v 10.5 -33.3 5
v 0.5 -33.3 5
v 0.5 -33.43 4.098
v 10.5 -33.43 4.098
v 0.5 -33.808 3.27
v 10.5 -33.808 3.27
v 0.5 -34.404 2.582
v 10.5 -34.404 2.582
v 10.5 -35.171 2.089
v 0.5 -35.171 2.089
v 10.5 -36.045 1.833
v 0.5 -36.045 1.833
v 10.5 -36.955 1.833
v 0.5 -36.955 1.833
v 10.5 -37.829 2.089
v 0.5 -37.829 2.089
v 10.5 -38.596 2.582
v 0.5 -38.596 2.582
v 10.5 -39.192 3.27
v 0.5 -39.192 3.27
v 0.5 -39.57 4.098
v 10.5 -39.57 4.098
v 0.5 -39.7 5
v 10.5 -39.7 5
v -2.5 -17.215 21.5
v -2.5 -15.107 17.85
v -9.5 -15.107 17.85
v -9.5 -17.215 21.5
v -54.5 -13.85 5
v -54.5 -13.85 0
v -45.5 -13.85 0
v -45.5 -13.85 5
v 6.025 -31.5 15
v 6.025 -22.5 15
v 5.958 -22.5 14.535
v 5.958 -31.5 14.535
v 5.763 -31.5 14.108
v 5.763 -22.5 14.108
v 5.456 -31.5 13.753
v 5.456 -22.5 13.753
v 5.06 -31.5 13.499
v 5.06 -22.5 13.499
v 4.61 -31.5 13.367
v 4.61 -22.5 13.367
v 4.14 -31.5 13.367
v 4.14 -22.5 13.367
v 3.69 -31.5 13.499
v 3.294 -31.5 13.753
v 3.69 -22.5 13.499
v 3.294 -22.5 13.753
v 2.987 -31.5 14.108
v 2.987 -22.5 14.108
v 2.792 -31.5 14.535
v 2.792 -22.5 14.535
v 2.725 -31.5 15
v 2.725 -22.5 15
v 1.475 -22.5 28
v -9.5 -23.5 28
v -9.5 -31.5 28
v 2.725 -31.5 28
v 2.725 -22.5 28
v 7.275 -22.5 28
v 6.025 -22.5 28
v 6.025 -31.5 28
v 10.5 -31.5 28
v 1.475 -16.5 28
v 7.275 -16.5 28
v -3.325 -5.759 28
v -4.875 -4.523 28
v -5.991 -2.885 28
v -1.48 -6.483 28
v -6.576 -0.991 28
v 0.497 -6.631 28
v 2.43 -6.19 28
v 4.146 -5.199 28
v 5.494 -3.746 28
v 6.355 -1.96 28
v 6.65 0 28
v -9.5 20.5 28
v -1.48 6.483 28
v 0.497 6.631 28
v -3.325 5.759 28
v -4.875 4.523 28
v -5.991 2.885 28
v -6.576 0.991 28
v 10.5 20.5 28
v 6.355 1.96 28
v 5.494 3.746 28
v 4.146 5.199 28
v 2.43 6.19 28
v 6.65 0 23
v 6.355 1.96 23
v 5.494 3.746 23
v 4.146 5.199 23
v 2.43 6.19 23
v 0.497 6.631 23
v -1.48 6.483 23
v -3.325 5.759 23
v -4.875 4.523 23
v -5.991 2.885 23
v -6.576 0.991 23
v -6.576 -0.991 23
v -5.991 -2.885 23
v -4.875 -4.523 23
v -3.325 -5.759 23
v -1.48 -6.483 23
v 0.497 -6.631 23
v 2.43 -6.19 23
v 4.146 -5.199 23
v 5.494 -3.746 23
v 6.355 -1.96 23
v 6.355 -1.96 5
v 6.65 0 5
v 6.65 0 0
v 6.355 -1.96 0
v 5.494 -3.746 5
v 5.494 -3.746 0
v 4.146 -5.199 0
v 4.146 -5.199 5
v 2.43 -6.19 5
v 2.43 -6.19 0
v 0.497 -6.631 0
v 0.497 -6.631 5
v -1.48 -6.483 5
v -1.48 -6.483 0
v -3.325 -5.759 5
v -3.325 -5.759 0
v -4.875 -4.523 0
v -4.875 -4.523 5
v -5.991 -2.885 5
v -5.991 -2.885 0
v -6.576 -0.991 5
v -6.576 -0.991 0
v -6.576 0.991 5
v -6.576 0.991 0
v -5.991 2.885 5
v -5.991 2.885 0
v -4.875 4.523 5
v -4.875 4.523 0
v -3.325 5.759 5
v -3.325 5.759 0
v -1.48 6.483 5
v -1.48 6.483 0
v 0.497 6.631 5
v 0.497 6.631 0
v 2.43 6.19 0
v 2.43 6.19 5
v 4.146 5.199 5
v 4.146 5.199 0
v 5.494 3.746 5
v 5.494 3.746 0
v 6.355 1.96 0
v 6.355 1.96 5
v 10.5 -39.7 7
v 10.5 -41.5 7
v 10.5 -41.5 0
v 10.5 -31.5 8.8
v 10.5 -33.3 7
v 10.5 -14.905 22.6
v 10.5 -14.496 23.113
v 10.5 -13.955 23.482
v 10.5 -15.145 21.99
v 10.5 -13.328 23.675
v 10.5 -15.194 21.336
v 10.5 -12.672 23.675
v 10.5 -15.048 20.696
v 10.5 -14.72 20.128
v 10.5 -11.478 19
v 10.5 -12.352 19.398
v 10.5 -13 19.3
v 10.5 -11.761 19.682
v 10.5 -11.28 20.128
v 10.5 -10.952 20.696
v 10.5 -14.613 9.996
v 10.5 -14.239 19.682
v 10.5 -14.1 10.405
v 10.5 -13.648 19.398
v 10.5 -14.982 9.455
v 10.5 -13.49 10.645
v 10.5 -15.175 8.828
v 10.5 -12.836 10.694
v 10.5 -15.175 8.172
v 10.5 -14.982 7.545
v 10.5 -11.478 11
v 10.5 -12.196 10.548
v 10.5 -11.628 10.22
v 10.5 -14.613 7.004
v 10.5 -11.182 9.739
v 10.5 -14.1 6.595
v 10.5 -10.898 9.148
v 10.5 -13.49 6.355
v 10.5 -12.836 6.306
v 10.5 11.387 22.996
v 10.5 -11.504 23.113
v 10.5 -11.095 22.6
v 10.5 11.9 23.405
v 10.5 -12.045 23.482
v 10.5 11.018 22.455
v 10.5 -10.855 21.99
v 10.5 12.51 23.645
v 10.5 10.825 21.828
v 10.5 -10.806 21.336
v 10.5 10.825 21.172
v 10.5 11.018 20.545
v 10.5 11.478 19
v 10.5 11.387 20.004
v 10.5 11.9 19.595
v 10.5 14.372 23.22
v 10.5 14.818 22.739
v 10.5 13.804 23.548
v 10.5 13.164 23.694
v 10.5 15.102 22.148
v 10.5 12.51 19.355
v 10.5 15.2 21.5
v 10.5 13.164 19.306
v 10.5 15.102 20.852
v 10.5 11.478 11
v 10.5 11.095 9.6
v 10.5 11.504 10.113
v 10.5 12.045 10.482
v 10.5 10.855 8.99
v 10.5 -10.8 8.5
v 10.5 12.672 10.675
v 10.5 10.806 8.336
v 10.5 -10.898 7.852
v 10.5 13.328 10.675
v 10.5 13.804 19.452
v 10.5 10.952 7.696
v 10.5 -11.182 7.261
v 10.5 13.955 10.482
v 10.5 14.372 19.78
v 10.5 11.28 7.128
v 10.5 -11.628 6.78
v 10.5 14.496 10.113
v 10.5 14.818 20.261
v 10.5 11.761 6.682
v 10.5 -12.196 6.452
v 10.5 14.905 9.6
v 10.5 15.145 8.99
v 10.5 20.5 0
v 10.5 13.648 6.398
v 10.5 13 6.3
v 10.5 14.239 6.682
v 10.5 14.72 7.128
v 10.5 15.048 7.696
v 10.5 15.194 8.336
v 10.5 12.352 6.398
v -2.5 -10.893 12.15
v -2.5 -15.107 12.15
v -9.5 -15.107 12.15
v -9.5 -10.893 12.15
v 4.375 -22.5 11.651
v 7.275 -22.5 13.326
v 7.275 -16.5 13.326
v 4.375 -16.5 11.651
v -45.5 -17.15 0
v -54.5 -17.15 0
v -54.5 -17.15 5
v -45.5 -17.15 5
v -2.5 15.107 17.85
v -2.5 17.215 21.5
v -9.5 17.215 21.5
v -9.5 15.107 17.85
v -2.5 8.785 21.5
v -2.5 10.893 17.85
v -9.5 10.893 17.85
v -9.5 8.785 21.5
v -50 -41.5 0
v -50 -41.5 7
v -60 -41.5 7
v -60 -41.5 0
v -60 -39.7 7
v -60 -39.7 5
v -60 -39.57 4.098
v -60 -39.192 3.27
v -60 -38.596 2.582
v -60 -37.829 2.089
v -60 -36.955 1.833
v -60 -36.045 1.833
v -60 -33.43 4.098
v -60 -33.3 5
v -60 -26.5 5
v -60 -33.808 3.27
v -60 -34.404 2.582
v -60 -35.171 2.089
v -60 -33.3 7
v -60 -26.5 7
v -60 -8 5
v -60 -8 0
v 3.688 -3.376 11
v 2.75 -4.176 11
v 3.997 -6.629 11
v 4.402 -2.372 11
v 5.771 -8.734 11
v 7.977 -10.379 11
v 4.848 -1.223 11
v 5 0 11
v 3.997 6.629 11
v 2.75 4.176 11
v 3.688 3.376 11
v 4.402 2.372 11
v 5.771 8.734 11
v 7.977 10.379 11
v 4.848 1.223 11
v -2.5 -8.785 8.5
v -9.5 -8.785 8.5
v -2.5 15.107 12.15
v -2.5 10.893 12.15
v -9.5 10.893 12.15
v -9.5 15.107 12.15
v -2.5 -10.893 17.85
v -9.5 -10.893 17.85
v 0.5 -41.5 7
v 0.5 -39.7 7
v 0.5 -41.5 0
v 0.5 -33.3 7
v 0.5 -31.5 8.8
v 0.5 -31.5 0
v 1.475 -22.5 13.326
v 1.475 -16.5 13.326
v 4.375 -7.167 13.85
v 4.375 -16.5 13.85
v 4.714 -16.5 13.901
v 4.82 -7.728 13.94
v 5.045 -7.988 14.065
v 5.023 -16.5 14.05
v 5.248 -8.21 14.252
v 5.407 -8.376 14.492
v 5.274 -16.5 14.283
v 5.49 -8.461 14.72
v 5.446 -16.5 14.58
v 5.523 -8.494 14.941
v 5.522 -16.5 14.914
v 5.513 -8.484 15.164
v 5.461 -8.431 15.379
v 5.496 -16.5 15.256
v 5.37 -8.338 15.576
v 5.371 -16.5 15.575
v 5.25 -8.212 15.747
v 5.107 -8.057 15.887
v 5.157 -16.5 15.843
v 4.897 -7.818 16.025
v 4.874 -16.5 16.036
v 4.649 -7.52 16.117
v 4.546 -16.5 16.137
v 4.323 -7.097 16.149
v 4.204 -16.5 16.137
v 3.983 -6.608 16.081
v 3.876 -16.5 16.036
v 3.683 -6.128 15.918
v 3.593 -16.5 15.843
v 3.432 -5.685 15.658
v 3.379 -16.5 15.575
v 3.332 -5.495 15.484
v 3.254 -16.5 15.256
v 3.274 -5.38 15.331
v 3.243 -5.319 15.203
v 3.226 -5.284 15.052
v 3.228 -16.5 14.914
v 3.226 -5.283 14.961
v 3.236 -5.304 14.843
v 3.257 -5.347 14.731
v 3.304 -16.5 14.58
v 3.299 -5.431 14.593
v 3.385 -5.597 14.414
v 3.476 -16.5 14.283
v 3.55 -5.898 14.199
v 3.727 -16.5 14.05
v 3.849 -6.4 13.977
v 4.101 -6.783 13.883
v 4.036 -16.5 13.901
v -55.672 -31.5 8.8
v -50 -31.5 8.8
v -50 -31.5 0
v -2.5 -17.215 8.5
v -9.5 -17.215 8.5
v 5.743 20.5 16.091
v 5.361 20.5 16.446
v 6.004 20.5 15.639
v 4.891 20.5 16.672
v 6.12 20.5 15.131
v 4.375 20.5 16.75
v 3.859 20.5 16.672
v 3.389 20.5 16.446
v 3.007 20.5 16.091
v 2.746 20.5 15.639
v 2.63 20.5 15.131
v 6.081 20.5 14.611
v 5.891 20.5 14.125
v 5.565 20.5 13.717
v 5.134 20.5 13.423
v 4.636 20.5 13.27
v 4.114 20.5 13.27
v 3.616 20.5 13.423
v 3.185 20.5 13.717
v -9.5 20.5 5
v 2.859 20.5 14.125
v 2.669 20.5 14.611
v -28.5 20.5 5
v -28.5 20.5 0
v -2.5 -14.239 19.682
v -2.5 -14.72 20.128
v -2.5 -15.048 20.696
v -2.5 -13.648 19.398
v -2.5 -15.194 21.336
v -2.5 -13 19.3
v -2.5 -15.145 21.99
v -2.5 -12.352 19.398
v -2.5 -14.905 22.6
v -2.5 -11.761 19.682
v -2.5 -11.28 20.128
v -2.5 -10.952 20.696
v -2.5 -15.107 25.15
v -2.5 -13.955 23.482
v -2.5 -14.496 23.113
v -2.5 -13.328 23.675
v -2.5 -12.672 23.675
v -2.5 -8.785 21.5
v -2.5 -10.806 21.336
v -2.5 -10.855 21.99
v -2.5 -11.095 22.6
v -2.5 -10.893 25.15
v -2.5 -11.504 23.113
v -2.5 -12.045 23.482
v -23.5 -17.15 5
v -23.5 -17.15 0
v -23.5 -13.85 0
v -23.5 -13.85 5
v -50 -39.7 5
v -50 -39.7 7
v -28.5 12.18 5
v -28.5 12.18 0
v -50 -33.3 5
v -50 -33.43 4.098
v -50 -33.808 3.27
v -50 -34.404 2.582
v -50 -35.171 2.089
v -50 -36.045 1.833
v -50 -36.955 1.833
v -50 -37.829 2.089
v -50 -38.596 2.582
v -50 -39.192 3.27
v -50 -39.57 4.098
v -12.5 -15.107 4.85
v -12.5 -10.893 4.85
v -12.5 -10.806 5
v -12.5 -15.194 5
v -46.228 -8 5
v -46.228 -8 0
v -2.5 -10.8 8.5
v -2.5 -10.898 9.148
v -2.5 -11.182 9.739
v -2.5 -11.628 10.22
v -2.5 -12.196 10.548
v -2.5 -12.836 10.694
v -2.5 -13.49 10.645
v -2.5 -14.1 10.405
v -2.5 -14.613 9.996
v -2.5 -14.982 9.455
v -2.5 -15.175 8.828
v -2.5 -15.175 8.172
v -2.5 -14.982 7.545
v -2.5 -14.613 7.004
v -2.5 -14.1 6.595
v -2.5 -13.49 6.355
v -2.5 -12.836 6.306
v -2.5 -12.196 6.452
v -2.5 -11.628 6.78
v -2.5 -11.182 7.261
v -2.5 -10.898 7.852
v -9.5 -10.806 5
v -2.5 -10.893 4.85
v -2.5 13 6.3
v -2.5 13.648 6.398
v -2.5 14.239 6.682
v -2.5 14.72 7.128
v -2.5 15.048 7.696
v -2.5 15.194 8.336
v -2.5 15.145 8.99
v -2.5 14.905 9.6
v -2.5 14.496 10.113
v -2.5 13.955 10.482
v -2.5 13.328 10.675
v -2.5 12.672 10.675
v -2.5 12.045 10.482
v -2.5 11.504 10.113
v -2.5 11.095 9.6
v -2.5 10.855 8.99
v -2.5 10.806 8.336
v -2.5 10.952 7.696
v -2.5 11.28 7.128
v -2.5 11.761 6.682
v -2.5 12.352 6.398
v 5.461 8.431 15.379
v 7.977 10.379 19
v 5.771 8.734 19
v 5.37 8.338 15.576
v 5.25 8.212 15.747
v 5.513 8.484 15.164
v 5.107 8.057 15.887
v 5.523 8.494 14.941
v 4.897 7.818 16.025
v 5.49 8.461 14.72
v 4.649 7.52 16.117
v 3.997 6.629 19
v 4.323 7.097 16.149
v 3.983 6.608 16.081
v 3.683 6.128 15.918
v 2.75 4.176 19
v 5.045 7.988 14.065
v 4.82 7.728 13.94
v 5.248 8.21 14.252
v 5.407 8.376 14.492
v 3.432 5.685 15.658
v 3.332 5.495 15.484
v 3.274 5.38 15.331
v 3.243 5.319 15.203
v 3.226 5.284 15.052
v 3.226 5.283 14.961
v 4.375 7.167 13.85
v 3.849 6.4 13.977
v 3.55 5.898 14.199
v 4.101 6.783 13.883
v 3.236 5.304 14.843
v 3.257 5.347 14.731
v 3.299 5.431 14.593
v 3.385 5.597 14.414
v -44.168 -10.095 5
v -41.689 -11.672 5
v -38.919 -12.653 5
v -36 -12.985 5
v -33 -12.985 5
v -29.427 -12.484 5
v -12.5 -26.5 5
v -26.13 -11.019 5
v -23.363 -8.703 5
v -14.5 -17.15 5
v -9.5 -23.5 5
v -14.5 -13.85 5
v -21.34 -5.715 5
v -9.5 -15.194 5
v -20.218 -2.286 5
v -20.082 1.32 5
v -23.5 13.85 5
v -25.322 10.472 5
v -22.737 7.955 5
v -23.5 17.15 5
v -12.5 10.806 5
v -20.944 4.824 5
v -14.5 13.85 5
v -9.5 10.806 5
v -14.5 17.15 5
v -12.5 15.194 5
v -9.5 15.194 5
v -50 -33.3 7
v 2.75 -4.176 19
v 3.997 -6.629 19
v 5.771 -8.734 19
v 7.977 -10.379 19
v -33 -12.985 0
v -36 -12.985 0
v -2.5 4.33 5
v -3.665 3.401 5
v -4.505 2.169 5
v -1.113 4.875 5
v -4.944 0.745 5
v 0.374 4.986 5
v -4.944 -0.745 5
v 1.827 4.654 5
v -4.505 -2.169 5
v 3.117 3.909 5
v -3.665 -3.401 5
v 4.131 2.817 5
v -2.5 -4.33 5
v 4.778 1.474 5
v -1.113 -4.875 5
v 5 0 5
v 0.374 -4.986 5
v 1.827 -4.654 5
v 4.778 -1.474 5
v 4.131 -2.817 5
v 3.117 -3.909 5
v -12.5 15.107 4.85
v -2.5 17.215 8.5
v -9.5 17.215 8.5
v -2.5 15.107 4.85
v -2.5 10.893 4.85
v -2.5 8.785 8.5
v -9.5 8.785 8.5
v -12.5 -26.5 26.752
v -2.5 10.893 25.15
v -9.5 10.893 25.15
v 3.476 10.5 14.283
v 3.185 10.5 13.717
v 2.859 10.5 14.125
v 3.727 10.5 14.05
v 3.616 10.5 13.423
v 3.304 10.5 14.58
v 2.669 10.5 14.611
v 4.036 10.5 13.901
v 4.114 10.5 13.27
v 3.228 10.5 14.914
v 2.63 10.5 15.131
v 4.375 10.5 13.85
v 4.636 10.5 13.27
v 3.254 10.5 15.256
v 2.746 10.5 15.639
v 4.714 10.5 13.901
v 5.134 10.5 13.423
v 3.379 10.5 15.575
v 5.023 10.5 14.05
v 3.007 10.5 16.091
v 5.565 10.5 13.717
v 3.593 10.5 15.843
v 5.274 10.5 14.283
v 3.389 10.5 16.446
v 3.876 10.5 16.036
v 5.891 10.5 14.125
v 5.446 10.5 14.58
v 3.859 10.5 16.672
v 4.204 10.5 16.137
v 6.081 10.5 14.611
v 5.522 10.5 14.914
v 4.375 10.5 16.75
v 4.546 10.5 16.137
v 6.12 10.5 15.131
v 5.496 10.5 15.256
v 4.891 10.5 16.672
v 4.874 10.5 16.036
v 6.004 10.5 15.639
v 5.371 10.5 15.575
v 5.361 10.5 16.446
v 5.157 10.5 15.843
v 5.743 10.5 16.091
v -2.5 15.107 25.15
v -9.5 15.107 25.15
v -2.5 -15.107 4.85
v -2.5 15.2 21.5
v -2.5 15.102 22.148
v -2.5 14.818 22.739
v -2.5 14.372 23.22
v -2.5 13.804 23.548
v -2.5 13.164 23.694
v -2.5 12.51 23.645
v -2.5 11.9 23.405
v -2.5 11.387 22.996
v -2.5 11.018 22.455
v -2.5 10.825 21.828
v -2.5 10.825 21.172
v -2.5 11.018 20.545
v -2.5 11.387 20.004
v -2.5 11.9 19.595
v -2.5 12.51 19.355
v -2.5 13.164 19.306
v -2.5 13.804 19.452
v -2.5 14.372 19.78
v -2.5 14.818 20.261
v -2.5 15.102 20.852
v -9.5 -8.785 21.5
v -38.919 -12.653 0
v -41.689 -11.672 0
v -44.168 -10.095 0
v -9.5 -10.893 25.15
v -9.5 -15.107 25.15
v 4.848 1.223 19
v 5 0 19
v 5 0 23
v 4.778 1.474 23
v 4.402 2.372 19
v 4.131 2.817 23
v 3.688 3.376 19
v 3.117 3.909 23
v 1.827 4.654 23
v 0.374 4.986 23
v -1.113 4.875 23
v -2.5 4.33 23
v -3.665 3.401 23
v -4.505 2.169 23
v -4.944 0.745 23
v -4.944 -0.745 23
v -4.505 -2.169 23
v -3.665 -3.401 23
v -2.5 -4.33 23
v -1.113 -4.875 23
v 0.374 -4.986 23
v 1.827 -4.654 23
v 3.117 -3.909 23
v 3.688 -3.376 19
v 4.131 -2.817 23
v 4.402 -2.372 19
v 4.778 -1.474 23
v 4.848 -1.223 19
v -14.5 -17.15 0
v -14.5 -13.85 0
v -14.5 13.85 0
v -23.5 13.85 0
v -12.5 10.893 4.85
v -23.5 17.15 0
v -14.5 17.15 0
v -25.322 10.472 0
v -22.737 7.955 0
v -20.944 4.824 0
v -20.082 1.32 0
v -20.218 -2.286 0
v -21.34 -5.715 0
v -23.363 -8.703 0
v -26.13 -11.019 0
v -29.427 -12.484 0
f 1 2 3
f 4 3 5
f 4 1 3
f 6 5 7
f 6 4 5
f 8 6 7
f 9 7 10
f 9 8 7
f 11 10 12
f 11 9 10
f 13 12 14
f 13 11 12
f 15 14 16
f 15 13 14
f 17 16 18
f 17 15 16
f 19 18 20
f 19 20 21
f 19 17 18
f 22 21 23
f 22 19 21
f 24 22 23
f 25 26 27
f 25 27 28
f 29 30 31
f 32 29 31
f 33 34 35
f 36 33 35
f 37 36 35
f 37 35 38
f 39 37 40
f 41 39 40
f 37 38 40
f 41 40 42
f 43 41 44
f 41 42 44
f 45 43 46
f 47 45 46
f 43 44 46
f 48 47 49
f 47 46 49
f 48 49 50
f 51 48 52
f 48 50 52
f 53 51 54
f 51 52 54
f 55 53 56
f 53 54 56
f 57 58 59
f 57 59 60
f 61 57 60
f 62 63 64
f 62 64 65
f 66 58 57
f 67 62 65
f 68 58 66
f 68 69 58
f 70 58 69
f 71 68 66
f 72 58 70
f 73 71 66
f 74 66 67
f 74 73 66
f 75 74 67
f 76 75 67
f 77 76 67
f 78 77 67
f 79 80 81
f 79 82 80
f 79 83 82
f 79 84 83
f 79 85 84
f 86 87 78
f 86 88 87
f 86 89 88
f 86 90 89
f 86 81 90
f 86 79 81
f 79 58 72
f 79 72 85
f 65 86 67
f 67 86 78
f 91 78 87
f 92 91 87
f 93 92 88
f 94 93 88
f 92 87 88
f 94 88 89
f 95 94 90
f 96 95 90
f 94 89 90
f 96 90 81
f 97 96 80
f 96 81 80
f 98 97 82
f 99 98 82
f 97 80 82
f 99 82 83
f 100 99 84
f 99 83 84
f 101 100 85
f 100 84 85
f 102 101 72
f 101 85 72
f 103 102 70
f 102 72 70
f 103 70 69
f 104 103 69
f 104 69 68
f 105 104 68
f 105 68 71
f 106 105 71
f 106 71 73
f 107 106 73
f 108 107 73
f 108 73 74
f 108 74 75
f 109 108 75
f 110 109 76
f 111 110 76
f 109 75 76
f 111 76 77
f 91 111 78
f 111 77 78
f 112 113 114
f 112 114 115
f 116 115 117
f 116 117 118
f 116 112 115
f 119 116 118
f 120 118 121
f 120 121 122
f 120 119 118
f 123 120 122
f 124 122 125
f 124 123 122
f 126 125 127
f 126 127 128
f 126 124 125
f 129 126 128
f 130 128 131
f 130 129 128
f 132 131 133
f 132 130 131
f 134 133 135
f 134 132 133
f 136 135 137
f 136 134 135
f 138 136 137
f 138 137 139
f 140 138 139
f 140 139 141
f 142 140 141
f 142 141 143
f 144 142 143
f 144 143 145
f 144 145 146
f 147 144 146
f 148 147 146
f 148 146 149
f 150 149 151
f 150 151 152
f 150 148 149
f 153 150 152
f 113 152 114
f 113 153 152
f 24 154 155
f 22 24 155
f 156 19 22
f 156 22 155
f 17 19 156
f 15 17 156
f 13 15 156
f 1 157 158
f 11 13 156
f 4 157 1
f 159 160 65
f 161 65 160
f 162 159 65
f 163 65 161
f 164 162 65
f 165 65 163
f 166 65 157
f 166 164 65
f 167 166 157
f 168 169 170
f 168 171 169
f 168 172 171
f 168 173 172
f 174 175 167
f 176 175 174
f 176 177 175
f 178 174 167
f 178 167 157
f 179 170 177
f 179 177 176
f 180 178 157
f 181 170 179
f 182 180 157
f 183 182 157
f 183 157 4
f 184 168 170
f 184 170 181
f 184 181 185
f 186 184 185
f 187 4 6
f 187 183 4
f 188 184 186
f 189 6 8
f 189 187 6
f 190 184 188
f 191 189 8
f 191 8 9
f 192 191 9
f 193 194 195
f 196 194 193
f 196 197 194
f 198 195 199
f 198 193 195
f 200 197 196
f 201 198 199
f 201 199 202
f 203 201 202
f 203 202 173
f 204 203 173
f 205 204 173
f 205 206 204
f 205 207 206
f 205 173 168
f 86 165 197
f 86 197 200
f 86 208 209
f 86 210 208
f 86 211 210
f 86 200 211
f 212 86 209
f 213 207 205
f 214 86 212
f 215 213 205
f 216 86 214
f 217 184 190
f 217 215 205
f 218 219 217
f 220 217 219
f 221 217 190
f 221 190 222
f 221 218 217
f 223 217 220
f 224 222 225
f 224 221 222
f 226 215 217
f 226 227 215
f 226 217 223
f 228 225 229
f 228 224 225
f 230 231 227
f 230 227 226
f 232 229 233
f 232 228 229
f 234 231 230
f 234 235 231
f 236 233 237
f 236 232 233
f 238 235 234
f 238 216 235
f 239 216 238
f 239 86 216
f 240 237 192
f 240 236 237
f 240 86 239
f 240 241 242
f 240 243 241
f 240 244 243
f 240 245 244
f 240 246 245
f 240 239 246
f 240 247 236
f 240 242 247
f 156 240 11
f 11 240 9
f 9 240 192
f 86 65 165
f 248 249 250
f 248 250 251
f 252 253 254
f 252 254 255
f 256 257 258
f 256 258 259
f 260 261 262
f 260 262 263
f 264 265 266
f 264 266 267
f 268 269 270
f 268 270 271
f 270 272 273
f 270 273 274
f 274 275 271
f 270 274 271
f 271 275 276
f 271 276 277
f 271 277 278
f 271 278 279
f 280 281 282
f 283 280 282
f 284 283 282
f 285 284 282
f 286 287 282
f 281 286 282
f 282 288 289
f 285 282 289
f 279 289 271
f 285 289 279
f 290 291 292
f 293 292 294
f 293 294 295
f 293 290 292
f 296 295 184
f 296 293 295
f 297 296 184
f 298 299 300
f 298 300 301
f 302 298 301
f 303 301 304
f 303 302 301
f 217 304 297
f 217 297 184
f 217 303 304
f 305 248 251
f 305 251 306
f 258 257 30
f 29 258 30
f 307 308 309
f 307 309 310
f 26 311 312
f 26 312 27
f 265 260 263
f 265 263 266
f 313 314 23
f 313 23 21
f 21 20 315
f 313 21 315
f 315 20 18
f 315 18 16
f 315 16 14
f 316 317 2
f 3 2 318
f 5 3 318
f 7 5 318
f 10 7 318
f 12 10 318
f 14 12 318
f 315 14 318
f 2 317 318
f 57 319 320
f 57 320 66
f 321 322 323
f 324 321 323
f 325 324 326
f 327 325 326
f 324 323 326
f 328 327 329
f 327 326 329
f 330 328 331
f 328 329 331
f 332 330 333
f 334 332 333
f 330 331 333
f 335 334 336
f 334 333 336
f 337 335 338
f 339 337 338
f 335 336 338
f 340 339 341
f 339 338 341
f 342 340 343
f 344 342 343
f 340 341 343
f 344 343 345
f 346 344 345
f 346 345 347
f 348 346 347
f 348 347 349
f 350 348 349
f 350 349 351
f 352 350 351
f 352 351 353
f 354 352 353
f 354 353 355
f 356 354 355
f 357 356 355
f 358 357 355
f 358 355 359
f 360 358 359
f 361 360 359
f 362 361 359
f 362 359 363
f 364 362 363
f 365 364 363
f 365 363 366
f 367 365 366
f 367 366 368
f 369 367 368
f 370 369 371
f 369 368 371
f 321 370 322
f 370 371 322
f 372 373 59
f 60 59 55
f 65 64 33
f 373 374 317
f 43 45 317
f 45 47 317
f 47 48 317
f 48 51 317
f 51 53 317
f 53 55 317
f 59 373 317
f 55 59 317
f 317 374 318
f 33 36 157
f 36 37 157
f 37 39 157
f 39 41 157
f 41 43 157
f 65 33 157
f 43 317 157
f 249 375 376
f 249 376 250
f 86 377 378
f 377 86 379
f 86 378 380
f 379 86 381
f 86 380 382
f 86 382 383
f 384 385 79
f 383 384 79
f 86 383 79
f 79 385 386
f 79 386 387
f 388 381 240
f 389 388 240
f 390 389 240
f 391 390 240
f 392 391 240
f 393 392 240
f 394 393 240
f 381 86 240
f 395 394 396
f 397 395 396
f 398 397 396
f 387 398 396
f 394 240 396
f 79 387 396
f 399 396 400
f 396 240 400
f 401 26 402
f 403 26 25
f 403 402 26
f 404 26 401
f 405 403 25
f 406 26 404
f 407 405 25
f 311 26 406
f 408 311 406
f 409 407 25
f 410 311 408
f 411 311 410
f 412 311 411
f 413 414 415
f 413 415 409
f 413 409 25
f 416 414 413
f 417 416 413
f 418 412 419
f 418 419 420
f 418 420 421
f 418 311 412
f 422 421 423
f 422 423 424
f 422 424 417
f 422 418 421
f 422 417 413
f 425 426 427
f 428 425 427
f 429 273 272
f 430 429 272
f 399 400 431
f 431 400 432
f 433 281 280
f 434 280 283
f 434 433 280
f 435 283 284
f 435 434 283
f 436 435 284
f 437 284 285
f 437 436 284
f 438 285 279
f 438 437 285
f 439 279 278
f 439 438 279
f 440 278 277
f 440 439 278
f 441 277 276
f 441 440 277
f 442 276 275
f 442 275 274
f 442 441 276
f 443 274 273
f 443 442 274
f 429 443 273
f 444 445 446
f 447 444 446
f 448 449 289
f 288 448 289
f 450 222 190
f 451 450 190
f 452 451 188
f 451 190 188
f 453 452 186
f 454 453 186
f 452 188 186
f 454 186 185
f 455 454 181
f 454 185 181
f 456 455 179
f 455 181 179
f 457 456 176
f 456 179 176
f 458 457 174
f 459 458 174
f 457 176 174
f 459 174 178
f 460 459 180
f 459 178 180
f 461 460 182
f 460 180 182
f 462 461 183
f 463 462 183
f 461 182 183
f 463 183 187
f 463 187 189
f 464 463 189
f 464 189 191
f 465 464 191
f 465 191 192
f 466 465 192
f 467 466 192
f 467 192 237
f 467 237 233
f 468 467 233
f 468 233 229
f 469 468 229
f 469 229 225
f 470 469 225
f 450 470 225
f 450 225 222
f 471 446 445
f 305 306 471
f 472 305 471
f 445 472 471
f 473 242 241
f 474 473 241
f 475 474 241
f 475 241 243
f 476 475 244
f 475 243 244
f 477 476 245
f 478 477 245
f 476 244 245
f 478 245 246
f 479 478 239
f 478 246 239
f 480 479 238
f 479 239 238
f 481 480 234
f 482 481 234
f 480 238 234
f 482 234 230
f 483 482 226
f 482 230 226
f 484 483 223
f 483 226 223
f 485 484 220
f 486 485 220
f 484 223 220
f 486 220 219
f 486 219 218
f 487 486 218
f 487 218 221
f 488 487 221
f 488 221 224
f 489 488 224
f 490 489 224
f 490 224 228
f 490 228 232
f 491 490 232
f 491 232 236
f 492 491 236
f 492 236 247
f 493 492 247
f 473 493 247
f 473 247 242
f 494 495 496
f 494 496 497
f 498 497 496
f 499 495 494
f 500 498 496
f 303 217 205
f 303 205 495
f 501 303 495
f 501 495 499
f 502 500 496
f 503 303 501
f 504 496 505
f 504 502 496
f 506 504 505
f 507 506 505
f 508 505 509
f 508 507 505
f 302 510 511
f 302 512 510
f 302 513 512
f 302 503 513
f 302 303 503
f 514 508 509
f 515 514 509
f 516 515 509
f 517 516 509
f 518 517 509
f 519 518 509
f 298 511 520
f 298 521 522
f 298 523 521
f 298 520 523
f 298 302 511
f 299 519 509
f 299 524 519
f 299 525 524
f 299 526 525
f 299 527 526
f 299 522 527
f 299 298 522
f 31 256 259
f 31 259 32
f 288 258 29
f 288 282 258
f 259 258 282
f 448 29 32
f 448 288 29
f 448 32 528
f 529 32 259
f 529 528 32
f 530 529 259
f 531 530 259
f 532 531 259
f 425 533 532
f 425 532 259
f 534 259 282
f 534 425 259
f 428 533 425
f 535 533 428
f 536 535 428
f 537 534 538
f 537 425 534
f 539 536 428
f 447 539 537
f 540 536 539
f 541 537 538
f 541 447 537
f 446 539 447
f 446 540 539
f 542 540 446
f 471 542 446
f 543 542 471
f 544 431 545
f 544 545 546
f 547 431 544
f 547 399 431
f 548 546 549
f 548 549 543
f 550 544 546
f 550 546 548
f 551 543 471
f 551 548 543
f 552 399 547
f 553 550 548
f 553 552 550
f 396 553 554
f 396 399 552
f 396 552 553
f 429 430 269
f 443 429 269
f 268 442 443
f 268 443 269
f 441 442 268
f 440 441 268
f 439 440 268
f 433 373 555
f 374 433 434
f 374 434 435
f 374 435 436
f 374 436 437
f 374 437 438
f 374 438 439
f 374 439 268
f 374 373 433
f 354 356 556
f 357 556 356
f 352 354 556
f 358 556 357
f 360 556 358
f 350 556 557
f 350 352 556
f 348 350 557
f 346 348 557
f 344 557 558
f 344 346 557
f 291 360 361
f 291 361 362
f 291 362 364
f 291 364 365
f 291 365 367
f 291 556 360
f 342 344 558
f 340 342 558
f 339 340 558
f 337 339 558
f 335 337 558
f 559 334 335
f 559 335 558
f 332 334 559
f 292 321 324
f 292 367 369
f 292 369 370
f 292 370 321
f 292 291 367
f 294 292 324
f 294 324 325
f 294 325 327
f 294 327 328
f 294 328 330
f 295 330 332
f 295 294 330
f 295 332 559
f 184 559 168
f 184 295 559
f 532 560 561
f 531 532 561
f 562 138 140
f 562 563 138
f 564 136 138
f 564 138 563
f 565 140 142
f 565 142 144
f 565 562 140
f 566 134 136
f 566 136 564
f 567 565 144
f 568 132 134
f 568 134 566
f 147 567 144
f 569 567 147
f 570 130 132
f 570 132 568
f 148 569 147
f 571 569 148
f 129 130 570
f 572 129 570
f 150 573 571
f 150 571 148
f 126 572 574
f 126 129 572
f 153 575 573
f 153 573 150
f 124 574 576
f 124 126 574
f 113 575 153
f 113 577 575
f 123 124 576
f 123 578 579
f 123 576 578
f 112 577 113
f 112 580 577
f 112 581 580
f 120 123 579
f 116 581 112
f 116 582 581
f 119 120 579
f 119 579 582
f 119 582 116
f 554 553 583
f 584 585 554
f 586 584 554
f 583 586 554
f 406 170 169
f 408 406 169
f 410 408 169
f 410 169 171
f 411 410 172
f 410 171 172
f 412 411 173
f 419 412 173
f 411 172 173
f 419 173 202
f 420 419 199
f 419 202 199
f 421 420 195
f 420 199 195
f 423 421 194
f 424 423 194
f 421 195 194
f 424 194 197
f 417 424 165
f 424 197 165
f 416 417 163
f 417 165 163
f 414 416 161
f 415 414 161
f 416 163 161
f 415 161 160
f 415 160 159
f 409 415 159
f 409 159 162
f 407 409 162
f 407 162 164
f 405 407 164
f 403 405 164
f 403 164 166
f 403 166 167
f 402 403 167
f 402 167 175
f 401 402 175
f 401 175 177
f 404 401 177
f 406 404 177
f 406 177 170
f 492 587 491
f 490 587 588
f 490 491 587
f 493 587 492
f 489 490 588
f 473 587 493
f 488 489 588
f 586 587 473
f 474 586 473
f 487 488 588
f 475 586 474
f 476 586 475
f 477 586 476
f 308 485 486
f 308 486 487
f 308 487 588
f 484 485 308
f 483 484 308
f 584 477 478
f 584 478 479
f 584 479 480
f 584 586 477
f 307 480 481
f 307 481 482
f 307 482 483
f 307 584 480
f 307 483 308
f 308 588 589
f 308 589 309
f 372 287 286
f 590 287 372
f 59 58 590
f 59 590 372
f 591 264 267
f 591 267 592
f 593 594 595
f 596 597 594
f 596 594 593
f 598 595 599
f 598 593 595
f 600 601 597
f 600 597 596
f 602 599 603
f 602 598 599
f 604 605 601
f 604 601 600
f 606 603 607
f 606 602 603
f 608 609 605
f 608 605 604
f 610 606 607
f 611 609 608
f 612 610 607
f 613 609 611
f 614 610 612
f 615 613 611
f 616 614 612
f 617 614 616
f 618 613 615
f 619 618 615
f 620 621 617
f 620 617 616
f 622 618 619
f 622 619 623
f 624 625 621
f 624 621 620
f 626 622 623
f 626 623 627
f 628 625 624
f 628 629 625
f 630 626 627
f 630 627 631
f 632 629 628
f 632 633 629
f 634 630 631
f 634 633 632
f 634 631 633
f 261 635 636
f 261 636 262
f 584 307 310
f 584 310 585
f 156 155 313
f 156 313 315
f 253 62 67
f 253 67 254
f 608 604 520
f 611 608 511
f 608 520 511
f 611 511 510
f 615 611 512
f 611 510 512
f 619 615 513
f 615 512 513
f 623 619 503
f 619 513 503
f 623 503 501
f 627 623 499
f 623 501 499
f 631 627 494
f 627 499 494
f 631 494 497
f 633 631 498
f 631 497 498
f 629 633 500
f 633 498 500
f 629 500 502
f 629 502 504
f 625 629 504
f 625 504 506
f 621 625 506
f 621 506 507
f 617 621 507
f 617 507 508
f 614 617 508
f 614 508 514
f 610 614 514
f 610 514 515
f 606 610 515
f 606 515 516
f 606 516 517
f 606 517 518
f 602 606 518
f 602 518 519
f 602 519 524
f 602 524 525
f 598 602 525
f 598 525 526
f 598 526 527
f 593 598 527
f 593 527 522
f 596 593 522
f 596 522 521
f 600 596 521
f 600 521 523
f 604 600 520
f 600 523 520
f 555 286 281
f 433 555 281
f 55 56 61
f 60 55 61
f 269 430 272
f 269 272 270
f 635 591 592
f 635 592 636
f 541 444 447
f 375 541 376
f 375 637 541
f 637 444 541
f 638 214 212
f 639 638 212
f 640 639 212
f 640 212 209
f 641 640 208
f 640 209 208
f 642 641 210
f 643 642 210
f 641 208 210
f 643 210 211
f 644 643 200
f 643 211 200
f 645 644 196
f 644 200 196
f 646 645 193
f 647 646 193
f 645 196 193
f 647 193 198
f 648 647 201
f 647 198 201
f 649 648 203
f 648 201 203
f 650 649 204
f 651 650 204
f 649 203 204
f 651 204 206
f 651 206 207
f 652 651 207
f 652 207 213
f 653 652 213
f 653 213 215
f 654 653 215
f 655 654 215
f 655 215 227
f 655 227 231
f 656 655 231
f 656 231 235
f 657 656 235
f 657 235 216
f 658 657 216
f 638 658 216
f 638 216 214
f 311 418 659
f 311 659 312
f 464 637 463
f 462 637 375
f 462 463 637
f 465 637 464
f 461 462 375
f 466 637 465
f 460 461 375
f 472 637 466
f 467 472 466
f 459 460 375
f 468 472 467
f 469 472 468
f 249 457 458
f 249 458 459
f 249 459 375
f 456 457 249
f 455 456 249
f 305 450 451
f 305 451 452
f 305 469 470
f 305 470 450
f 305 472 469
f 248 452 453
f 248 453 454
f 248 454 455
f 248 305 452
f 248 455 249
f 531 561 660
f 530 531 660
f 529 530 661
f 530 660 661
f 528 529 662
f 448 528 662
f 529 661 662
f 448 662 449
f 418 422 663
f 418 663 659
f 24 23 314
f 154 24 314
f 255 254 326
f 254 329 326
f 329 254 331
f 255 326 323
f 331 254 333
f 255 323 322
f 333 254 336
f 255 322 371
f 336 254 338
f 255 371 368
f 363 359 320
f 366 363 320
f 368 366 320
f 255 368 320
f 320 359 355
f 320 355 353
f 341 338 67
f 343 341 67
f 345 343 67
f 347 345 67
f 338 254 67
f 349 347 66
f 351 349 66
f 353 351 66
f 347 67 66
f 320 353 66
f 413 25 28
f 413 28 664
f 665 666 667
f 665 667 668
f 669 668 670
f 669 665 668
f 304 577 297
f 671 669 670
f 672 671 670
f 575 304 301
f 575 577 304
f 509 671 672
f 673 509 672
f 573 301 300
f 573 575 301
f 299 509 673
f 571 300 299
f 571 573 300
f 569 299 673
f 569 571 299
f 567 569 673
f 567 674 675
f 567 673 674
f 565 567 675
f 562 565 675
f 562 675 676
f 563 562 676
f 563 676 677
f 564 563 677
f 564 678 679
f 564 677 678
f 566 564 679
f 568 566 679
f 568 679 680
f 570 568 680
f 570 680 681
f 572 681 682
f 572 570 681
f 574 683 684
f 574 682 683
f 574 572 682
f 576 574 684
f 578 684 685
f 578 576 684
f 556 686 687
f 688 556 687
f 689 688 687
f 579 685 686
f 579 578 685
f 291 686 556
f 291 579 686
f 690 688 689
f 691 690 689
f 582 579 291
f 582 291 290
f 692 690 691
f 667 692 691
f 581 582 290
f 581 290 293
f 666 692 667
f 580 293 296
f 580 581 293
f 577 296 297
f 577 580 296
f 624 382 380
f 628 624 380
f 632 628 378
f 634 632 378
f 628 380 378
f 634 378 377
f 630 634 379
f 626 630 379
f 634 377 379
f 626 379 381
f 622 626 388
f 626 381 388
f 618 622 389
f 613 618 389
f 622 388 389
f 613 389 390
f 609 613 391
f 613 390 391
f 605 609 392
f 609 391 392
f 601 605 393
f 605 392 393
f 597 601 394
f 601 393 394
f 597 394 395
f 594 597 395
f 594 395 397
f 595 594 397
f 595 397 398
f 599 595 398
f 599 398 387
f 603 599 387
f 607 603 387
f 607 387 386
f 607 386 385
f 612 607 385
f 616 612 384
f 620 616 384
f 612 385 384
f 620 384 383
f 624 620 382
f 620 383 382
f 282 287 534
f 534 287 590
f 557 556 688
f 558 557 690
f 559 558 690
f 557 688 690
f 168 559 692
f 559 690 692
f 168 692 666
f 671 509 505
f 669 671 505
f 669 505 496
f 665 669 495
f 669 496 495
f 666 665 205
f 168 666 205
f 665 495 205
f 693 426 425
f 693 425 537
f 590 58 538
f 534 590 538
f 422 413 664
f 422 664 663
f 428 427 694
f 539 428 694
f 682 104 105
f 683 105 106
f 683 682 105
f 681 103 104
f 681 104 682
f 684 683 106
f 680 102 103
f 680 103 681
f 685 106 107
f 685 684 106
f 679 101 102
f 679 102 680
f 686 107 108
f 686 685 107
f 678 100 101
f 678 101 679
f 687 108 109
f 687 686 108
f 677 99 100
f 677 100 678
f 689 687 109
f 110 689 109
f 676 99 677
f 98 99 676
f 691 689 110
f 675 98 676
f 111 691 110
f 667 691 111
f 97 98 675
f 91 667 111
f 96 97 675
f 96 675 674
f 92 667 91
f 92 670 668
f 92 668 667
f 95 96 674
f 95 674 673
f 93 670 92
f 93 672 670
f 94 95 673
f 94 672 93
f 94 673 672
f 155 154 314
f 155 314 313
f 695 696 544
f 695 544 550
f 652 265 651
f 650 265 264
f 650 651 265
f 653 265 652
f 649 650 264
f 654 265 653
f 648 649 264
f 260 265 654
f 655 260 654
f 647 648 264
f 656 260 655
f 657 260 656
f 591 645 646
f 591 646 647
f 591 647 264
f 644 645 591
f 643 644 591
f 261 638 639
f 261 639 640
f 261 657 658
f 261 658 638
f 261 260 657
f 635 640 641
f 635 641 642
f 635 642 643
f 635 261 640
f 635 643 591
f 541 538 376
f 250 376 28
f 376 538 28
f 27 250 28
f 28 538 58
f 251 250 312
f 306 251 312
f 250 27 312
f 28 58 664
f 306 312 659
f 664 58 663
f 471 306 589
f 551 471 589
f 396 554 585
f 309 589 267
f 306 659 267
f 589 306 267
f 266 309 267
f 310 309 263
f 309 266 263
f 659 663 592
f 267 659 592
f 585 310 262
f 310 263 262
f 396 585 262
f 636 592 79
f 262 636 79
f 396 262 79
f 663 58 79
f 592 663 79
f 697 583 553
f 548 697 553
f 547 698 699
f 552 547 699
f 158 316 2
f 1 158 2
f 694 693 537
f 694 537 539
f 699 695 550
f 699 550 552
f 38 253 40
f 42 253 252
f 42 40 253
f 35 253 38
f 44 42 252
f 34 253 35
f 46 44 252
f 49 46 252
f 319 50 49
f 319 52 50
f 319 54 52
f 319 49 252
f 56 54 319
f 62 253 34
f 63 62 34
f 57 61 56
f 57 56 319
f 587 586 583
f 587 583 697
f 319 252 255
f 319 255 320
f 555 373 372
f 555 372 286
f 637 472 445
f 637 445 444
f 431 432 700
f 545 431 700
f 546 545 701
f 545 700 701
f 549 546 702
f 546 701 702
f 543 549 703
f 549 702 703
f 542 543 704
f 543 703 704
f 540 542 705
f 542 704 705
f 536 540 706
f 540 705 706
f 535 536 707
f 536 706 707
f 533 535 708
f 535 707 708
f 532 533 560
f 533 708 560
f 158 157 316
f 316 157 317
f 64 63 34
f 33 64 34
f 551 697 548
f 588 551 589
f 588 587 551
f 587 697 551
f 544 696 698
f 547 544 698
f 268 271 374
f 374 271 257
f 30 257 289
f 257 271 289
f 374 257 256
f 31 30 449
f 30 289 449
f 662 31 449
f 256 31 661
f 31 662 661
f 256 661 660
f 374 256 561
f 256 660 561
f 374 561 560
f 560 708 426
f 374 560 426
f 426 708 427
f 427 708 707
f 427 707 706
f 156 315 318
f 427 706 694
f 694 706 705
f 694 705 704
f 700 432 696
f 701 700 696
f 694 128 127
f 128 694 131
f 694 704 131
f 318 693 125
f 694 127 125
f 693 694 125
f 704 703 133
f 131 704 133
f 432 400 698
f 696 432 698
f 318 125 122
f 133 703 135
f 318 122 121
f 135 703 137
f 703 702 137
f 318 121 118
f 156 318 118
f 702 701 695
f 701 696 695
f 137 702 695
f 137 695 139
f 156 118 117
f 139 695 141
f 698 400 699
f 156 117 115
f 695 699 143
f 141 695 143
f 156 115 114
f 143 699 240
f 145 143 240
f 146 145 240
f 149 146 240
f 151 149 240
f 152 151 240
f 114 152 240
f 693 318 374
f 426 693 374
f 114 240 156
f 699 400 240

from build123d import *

# Parameters (mm, degrees)
SKETCH1_R               = 5
SKETCH1_W               = 9
SKETCH1_H               = 3.3
BOSS_EXTRUDE1_DEPTH     = 28
SKETCH2_W               = 50.5
SKETCH2_H               = 47
CUT_EXTRUDE1_DEPTH      = 23
SKETCH3_R               = 6.65
CUT_EXTRUDE2_DEPTH      = 5
CUT_EXTRUDE3_START      = -5
SKETCH4_R               = 6.65
CUT_EXTRUDE3_DEPTH      = 5
SKETCH5_R               = 12
CUT_EXTRUDE4_DEPTH      = 8
CUT_EXTRUDE5_START      = -9
CUT_EXTRUDE5_DEPTH      = 9
CUT_EXTRUDE6_DEPTH      = 6
SKETCH8_R               = 1.15
CUT_EXTRUDE7_DEPTH      = 85.190260719
CHAMFER1_SIZE           = 21
CHAMFER1_SIZE2          = 50.5
SKETCH9_R               = 2.2
CUT_EXTRUDE8_DEPTH      = 83.137080542
CUT_EXTRUDE9_DEPTH      = 3
CUT_EXTRUDE9_DEPTH_BACK = 7
BOSS_EXTRUDE2_DEPTH     = 10
LPATTERN1_COUNT         = 2
LPATTERN1_PITCH         = 60.5
SKETCH12_R              = 1.75
CUT_EXTRUDE10_DEPTH     = 10
CHAMFER2_SIZE           = 3
CHAMFER3_SIZE           = 1.8


with BuildPart() as part:
    # Sketch1 → Boss-Extrude1 (new body)
    with BuildSketch(Plane.XY):
        with BuildLine():
            Line((-60, -31.5), (10.5, -31.5))
            Line((10.5, -31.5), (10.5, 20.5))
            Line((10.5, 20.5), (-28.5, 20.5))
            Line((-28.5, 20.5), (-28.5, 12.180409823))
            ThreePointArc((-28.5, 12.180409823), (-20.217668105, -2.285689125), (-33, -12.985083113))
            Line((-33, -12.985083113), (-36, -12.985083113))
            ThreePointArc((-36, -12.985083113), (-41.689100041, -11.672468641), (-46.228019527, -8))
            Line((-46.228019527, -8), (-60, -8))
            Line((-60, -8), (-60, -31.5))
        make_face()
        Circle(SKETCH1_R, mode=Mode.SUBTRACT)
        with Locations((-19, 15.5)):
            Rectangle(SKETCH1_W, SKETCH1_H, mode=Mode.SUBTRACT)
        with Locations((-19, -15.5)):
            Rectangle(SKETCH1_W, SKETCH1_H, mode=Mode.SUBTRACT)
        with Locations((-50, -15.5)):
            Rectangle(SKETCH1_W, SKETCH1_H, mode=Mode.SUBTRACT)
    extrude(amount=BOSS_EXTRUDE1_DEPTH)

    # Sketch2 → Cut-Extrude1 (cut)
    with BuildSketch(Plane.XY.offset(28)):
        with Locations((-34.75, -3)):
            Rectangle(SKETCH2_W, SKETCH2_H)
    extrude(amount=-CUT_EXTRUDE1_DEPTH, mode=Mode.SUBTRACT)

    # Sketch3 → Cut-Extrude2 (cut)
    with BuildSketch(Plane.XY.offset(28)):
        Circle(SKETCH3_R)
    extrude(amount=-CUT_EXTRUDE2_DEPTH, mode=Mode.SUBTRACT)

    # Sketch4 → Cut-Extrude3 (cut)
    with BuildSketch(Plane(origin=(0, 0, 0), x_dir=(-1, 0, 0), z_dir=(0, 0, -1)).offset(CUT_EXTRUDE3_START)):
        with Locations(Location((0, 0, 0), (0, 0, 180))):
            Circle(SKETCH4_R)
    extrude(amount=CUT_EXTRUDE3_DEPTH, mode=Mode.SUBTRACT)

    # Sketch5 → Cut-Extrude4 (cut)
    with BuildSketch(Plane.XY.offset(11)):
        with Locations((14, 0)):
            Circle(SKETCH5_R)
    extrude(amount=CUT_EXTRUDE4_DEPTH, mode=Mode.SUBTRACT)

    # Sketch6 → Cut-Extrude5 (cut)
    with BuildSketch(Plane.XZ.offset(31.5).offset(CUT_EXTRUDE5_START)):
        with BuildLine():
            Line((2.725, 15), (2.725, 28))
            Line((2.725, 28), (6.025, 28))
            Line((6.025, 28), (6.025, 15))
            ThreePointArc((6.025, 15), (4.375, 13.35), (2.725, 15))
        make_face()
    extrude(amount=CUT_EXTRUDE5_DEPTH, mode=Mode.SUBTRACT)

    # Sketch7 → Cut-Extrude6 (cut)
    with BuildSketch(Plane.XZ.offset(22.5)):
        Polygon((1.475, 28), (7.275, 28), (7.275, 13.325684219), (4.375, 11.651368439), (1.475, 13.325684219), align=None)
    extrude(amount=-CUT_EXTRUDE6_DEPTH, mode=Mode.SUBTRACT)

    # Sketch8 → Cut-Extrude7 (cut, through all)
    with BuildSketch(Plane.XZ.offset(31.5)):
        with Locations(Location((4.375, 15, 0), (0, 0, 270))):
            Circle(SKETCH8_R)
    extrude(amount=-CUT_EXTRUDE7_DEPTH, mode=Mode.SUBTRACT)

    # Chamfer1
    chamfer1_edges = [part.edges().sort_by_distance(p)[0] for p in [
        (-60, -29, 28),
    ]]
    chamfer1_side = [part.faces().sort_by_distance(p)[0] for p in [
        (-60, -19.75, 0.365547535),
    ]]
    chamfer(chamfer1_edges, length=CHAMFER1_SIZE, length2=CHAMFER1_SIZE2, reference=chamfer1_side[0])

    # Sketch9 → Cut-Extrude8 (cut, through all)
    with BuildSketch(Plane(origin=(10.5, 0, 0), x_dir=(0, 0, -1), z_dir=(1, 0, 0))):
        with Locations((-8.5, 13)):
            Circle(SKETCH9_R)
        with Locations(Location((-21.5, 13, 0), (0, 0, 90))):
            Circle(SKETCH9_R)
        with Locations(Location((-8.5, -13, 0), (0, 0, 90))):
            Circle(SKETCH9_R)
        with Locations((-21.5, -13)):
            Circle(SKETCH9_R)
    extrude(amount=-CUT_EXTRUDE8_DEPTH, mode=Mode.SUBTRACT)

    # Sketch10 → Cut-Extrude9 (cut, two sides: drawn at the far end of the back side and taken through both)
    with BuildSketch(Plane.ZY.offset(9.5).offset(-CUT_EXTRUDE9_DEPTH_BACK)):
        Polygon((4.85, 15.107328483), (4.85, 10.892671517), (8.5, 8.785343035), (12.15, 10.892671517), (12.15, 15.107328483), (8.5, 17.214656965), align=None)
        Polygon((25.15, 10.892671517), (25.15, 15.107328483), (21.5, 17.214656965), (17.85, 15.107328483), (17.85, 10.892671517), (21.5, 8.785343035), align=None)
        Polygon((25.15, -10.892671517), (21.5, -8.785343035), (17.85, -10.892671517), (17.85, -15.107328483), (21.5, -17.214656965), (25.15, -15.107328483), align=None)
        Polygon((12.15, -10.892671517), (8.5, -8.785343035), (4.85, -10.892671517), (4.85, -15.107328483), (8.5, -17.214656965), (12.15, -15.107328483), align=None)
    extrude(amount=CUT_EXTRUDE9_DEPTH + CUT_EXTRUDE9_DEPTH_BACK, mode=Mode.SUBTRACT)

    # Sketch11 → Boss-Extrude2 (add)
    with BuildSketch(Plane(origin=(10.5, 0, 0), x_dir=(0, 0, -1), z_dir=(1, 0, 0))):
        with BuildLine():
            Line((0, -31.5), (-7, -31.5))
            Line((-7, -31.5), (-7, -33.3))
            Line((-7, -33.3), (-5, -33.3))
            ThreePointArc((-5, -33.3), (-1.8, -36.5), (-5, -39.7))
            Line((-5, -39.7), (-7, -39.7))
            Line((-7, -39.7), (-7, -41.5))
            Line((-7, -41.5), (0, -41.5))
            Line((0, -41.5), (0, -31.5))
        make_face()
    boss_extrude2 = extrude(amount=-BOSS_EXTRUDE2_DEPTH)

    # LPattern1: Boss-Extrude2 ×2
    with Locations(*[(-i * LPATTERN1_PITCH, 0, 0) for i in range(1, LPATTERN1_COUNT)]):
        add(boss_extrude2)

    # Sketch12 → Cut-Extrude10 (cut)
    with BuildSketch(Plane(origin=(0, 20.5, 0), x_dir=(1, 0, 0), z_dir=(0, 1, 0))):
        with Locations(Location((4.375, -15, 0), (0, 0, 270))):
            Circle(SKETCH12_R)
    extrude(amount=-CUT_EXTRUDE10_DEPTH, mode=Mode.SUBTRACT)

    # Chamfer2
    chamfer2_edges = [part.edges().sort_by_distance(p)[0] for p in [
        (-9.5, -26.5, 16.5),
    ]]
    chamfer(chamfer2_edges, length=CHAMFER2_SIZE)

    # Chamfer3
    chamfer3_edges = [part.edges().sort_by_distance(p)[0] for p in [
        (-55, -31.5, 7),
        (5.5, -31.5, 7),
    ]]
    chamfer(chamfer3_edges, length=CHAMFER3_SIZE - 0.0001)  # a hair under: the kernel refuses the full size


solid = part.part
